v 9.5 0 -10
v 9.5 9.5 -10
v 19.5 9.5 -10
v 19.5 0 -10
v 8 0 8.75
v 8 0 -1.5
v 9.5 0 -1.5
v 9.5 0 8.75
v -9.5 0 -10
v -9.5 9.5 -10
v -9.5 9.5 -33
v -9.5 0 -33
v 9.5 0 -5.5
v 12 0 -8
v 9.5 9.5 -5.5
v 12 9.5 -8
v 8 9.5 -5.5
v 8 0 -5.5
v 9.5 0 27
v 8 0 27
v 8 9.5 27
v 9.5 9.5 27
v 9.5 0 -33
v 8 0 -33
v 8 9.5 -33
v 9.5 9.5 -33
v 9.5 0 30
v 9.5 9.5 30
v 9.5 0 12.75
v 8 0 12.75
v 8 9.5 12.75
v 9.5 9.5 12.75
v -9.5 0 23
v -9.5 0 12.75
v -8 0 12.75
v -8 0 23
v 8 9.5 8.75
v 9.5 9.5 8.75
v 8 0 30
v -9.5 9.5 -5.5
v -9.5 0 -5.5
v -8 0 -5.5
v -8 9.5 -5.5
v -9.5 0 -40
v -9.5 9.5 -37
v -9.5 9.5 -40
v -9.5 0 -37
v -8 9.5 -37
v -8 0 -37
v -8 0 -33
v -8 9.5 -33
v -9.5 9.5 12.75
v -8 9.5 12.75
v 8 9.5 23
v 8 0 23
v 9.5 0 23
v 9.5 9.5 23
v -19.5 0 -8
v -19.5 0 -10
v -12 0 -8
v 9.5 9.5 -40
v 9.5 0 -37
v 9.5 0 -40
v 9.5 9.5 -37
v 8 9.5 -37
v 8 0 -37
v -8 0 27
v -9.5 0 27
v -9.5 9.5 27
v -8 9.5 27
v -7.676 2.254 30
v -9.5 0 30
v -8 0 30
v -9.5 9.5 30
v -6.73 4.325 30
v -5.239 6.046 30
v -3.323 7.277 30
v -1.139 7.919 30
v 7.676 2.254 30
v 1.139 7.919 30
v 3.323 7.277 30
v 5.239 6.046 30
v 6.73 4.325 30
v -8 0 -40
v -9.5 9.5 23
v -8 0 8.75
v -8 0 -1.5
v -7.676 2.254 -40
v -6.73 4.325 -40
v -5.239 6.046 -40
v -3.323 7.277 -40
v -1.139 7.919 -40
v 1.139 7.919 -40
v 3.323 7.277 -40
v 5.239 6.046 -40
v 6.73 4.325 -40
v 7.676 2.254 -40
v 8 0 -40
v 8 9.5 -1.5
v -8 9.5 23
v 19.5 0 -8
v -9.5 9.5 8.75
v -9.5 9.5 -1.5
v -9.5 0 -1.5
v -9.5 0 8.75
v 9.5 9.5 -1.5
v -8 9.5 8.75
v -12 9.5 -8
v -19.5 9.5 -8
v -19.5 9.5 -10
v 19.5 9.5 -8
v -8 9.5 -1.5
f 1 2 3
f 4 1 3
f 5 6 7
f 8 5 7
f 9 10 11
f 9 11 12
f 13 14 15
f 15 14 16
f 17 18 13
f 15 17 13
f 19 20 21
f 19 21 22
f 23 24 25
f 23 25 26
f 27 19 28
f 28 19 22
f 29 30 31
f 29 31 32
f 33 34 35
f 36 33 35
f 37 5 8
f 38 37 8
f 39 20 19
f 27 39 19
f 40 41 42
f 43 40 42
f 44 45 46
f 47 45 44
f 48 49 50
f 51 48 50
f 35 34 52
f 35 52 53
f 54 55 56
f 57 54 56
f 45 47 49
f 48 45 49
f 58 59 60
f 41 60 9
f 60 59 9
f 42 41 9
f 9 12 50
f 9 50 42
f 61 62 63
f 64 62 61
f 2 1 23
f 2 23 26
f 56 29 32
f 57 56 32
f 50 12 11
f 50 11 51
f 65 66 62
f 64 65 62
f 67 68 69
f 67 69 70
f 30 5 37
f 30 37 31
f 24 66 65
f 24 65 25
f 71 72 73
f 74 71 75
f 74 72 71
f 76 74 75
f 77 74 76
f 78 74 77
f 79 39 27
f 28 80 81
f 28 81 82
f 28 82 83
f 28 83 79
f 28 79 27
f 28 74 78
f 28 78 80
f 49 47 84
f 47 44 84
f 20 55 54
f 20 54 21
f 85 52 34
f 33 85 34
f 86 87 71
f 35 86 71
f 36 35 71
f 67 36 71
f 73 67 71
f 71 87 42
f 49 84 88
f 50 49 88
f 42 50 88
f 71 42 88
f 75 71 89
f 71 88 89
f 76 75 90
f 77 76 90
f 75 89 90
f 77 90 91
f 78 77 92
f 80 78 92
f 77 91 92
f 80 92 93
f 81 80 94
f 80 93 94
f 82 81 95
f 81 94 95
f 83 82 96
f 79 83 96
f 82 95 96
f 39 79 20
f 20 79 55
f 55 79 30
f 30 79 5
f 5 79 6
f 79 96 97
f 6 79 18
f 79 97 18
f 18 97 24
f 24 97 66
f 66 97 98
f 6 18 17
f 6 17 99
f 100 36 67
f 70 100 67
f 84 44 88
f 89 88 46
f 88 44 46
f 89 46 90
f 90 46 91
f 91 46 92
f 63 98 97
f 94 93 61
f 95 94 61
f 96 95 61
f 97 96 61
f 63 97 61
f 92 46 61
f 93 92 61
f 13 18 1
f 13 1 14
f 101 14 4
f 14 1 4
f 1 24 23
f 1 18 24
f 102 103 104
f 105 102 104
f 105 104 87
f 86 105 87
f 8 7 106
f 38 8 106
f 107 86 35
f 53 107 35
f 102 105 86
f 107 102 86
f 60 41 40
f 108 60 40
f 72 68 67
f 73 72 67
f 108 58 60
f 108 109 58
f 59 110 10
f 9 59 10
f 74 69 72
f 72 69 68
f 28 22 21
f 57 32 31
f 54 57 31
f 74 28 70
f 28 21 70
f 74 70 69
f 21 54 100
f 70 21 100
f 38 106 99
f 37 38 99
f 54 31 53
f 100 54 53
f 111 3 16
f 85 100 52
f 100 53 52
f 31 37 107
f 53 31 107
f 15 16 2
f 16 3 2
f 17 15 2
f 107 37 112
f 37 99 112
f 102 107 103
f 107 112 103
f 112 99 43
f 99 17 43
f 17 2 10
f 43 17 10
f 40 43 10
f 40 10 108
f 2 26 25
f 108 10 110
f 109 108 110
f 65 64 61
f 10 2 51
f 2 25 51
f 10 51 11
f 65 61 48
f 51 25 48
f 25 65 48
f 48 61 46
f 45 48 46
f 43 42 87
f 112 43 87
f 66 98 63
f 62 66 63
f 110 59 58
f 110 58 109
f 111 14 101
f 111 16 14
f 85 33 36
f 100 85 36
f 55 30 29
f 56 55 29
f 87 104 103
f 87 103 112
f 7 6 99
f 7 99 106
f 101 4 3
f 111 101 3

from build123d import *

# Parameters (mm, degrees)
F1_DEPTH = 40
F3_W     = 10
F3_H     = 9.5
F4_DEPTH = 2
F5_DEPTH = 30
F6_W     = 1.5
F6_H     = 4
F7_DEPTH = 9.501
F8_SIZE  = 2.49999


# Not quite as in the source:
# - a fillet or chamfer is up to 0.001 mm smaller than in the source, because OpenCascade refuses the exact size


with BuildPart() as f1:
    # F0 (on Top) → F1 (new body)
    with BuildSketch(Plane.XY):
        with BuildLine():
            Line((-9.5, 0), (-8, 0))
            ThreePointArc((-8, 0), (0, 8), (8, 0))
            Line((8, 0), (9.5, 0))
            Line((9.5, 0), (9.5, 9.5))
            Line((9.5, 9.5), (-9.5, 9.5))
            Line((-9.5, 9.5), (-9.5, 0))
        make_face()
    extrude(amount=-F1_DEPTH)

    # F3 (on offset) → F4 (join)
    with BuildSketch(Plane.XY.offset(-10)):
        with Locations((-14.5, 4.75)):
            Rectangle(F3_W, F3_H)
        with Locations((14.5, 4.75)):
            Rectangle(F3_W, F3_H)
    extrude(amount=F4_DEPTH)

    # F5 (add): a face of the model
    f5_faces = [f1.faces().sort_by_distance(p)[0] for p in [
        (-8.75, 0.2124264579, 0),
    ]]
    extrude(f5_faces, amount=F5_DEPTH)

    # F6 (on face) → F7 (cut, through all)
    with BuildSketch(Plane.XZ):
        with Locations((-8.75, -3.5)):
            Rectangle(F6_W, F6_H)
        with Locations((-8.75, -35)):
            Rectangle(F6_W, F6_H)
        with Locations((8.75, -3.5)):
            Rectangle(F6_W, F6_H)
        with Locations((8.75, -35)):
            Rectangle(F6_W, F6_H)
        with Locations((-8.75, 25)):
            Rectangle(F6_W, F6_H)
        with Locations((8.75, 25)):
            Rectangle(F6_W, F6_H)
        with Locations((-8.75, 10.75)):
            Rectangle(F6_W, F6_H)
        with Locations((8.75, 10.75)):
            Rectangle(F6_W, F6_H)
    extrude(amount=-F7_DEPTH, mode=Mode.SUBTRACT)

    # F8 (size 2.5 in the source; OpenCascade refuses exactly that, so slightly less here)
    f8_edges = [f1.edges().sort_by_distance(p)[0] for p in [
        (-9.5, 4.75, -8),
        (9.5, 4.75, -8),
    ]]
    chamfer(f8_edges, length=F8_SIZE)


solid = f1.part
